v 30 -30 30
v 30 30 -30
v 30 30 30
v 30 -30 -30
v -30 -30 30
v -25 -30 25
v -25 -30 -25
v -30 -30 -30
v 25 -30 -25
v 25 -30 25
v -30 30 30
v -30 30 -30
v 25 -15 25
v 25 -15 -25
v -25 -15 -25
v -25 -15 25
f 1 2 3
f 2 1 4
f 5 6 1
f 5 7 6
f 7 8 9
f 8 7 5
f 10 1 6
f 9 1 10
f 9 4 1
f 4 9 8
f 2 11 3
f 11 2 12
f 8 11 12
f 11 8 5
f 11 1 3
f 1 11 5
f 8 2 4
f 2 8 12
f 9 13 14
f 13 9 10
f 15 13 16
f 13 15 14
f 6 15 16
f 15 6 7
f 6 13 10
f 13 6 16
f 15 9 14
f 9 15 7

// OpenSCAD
// rotate([90,0,0]) results in a matrix with some close-to-zero values
// Transforming an empty boundingbox by this matrix has caused a problem resulting
// in the union being evaluated to nothing.
rotate([90,0,0]) 
difference() {
  cube(60, center=true);
  union() {
    translate([0,0,40]) cube(50, center=true);
    cube(0);
  }
}
